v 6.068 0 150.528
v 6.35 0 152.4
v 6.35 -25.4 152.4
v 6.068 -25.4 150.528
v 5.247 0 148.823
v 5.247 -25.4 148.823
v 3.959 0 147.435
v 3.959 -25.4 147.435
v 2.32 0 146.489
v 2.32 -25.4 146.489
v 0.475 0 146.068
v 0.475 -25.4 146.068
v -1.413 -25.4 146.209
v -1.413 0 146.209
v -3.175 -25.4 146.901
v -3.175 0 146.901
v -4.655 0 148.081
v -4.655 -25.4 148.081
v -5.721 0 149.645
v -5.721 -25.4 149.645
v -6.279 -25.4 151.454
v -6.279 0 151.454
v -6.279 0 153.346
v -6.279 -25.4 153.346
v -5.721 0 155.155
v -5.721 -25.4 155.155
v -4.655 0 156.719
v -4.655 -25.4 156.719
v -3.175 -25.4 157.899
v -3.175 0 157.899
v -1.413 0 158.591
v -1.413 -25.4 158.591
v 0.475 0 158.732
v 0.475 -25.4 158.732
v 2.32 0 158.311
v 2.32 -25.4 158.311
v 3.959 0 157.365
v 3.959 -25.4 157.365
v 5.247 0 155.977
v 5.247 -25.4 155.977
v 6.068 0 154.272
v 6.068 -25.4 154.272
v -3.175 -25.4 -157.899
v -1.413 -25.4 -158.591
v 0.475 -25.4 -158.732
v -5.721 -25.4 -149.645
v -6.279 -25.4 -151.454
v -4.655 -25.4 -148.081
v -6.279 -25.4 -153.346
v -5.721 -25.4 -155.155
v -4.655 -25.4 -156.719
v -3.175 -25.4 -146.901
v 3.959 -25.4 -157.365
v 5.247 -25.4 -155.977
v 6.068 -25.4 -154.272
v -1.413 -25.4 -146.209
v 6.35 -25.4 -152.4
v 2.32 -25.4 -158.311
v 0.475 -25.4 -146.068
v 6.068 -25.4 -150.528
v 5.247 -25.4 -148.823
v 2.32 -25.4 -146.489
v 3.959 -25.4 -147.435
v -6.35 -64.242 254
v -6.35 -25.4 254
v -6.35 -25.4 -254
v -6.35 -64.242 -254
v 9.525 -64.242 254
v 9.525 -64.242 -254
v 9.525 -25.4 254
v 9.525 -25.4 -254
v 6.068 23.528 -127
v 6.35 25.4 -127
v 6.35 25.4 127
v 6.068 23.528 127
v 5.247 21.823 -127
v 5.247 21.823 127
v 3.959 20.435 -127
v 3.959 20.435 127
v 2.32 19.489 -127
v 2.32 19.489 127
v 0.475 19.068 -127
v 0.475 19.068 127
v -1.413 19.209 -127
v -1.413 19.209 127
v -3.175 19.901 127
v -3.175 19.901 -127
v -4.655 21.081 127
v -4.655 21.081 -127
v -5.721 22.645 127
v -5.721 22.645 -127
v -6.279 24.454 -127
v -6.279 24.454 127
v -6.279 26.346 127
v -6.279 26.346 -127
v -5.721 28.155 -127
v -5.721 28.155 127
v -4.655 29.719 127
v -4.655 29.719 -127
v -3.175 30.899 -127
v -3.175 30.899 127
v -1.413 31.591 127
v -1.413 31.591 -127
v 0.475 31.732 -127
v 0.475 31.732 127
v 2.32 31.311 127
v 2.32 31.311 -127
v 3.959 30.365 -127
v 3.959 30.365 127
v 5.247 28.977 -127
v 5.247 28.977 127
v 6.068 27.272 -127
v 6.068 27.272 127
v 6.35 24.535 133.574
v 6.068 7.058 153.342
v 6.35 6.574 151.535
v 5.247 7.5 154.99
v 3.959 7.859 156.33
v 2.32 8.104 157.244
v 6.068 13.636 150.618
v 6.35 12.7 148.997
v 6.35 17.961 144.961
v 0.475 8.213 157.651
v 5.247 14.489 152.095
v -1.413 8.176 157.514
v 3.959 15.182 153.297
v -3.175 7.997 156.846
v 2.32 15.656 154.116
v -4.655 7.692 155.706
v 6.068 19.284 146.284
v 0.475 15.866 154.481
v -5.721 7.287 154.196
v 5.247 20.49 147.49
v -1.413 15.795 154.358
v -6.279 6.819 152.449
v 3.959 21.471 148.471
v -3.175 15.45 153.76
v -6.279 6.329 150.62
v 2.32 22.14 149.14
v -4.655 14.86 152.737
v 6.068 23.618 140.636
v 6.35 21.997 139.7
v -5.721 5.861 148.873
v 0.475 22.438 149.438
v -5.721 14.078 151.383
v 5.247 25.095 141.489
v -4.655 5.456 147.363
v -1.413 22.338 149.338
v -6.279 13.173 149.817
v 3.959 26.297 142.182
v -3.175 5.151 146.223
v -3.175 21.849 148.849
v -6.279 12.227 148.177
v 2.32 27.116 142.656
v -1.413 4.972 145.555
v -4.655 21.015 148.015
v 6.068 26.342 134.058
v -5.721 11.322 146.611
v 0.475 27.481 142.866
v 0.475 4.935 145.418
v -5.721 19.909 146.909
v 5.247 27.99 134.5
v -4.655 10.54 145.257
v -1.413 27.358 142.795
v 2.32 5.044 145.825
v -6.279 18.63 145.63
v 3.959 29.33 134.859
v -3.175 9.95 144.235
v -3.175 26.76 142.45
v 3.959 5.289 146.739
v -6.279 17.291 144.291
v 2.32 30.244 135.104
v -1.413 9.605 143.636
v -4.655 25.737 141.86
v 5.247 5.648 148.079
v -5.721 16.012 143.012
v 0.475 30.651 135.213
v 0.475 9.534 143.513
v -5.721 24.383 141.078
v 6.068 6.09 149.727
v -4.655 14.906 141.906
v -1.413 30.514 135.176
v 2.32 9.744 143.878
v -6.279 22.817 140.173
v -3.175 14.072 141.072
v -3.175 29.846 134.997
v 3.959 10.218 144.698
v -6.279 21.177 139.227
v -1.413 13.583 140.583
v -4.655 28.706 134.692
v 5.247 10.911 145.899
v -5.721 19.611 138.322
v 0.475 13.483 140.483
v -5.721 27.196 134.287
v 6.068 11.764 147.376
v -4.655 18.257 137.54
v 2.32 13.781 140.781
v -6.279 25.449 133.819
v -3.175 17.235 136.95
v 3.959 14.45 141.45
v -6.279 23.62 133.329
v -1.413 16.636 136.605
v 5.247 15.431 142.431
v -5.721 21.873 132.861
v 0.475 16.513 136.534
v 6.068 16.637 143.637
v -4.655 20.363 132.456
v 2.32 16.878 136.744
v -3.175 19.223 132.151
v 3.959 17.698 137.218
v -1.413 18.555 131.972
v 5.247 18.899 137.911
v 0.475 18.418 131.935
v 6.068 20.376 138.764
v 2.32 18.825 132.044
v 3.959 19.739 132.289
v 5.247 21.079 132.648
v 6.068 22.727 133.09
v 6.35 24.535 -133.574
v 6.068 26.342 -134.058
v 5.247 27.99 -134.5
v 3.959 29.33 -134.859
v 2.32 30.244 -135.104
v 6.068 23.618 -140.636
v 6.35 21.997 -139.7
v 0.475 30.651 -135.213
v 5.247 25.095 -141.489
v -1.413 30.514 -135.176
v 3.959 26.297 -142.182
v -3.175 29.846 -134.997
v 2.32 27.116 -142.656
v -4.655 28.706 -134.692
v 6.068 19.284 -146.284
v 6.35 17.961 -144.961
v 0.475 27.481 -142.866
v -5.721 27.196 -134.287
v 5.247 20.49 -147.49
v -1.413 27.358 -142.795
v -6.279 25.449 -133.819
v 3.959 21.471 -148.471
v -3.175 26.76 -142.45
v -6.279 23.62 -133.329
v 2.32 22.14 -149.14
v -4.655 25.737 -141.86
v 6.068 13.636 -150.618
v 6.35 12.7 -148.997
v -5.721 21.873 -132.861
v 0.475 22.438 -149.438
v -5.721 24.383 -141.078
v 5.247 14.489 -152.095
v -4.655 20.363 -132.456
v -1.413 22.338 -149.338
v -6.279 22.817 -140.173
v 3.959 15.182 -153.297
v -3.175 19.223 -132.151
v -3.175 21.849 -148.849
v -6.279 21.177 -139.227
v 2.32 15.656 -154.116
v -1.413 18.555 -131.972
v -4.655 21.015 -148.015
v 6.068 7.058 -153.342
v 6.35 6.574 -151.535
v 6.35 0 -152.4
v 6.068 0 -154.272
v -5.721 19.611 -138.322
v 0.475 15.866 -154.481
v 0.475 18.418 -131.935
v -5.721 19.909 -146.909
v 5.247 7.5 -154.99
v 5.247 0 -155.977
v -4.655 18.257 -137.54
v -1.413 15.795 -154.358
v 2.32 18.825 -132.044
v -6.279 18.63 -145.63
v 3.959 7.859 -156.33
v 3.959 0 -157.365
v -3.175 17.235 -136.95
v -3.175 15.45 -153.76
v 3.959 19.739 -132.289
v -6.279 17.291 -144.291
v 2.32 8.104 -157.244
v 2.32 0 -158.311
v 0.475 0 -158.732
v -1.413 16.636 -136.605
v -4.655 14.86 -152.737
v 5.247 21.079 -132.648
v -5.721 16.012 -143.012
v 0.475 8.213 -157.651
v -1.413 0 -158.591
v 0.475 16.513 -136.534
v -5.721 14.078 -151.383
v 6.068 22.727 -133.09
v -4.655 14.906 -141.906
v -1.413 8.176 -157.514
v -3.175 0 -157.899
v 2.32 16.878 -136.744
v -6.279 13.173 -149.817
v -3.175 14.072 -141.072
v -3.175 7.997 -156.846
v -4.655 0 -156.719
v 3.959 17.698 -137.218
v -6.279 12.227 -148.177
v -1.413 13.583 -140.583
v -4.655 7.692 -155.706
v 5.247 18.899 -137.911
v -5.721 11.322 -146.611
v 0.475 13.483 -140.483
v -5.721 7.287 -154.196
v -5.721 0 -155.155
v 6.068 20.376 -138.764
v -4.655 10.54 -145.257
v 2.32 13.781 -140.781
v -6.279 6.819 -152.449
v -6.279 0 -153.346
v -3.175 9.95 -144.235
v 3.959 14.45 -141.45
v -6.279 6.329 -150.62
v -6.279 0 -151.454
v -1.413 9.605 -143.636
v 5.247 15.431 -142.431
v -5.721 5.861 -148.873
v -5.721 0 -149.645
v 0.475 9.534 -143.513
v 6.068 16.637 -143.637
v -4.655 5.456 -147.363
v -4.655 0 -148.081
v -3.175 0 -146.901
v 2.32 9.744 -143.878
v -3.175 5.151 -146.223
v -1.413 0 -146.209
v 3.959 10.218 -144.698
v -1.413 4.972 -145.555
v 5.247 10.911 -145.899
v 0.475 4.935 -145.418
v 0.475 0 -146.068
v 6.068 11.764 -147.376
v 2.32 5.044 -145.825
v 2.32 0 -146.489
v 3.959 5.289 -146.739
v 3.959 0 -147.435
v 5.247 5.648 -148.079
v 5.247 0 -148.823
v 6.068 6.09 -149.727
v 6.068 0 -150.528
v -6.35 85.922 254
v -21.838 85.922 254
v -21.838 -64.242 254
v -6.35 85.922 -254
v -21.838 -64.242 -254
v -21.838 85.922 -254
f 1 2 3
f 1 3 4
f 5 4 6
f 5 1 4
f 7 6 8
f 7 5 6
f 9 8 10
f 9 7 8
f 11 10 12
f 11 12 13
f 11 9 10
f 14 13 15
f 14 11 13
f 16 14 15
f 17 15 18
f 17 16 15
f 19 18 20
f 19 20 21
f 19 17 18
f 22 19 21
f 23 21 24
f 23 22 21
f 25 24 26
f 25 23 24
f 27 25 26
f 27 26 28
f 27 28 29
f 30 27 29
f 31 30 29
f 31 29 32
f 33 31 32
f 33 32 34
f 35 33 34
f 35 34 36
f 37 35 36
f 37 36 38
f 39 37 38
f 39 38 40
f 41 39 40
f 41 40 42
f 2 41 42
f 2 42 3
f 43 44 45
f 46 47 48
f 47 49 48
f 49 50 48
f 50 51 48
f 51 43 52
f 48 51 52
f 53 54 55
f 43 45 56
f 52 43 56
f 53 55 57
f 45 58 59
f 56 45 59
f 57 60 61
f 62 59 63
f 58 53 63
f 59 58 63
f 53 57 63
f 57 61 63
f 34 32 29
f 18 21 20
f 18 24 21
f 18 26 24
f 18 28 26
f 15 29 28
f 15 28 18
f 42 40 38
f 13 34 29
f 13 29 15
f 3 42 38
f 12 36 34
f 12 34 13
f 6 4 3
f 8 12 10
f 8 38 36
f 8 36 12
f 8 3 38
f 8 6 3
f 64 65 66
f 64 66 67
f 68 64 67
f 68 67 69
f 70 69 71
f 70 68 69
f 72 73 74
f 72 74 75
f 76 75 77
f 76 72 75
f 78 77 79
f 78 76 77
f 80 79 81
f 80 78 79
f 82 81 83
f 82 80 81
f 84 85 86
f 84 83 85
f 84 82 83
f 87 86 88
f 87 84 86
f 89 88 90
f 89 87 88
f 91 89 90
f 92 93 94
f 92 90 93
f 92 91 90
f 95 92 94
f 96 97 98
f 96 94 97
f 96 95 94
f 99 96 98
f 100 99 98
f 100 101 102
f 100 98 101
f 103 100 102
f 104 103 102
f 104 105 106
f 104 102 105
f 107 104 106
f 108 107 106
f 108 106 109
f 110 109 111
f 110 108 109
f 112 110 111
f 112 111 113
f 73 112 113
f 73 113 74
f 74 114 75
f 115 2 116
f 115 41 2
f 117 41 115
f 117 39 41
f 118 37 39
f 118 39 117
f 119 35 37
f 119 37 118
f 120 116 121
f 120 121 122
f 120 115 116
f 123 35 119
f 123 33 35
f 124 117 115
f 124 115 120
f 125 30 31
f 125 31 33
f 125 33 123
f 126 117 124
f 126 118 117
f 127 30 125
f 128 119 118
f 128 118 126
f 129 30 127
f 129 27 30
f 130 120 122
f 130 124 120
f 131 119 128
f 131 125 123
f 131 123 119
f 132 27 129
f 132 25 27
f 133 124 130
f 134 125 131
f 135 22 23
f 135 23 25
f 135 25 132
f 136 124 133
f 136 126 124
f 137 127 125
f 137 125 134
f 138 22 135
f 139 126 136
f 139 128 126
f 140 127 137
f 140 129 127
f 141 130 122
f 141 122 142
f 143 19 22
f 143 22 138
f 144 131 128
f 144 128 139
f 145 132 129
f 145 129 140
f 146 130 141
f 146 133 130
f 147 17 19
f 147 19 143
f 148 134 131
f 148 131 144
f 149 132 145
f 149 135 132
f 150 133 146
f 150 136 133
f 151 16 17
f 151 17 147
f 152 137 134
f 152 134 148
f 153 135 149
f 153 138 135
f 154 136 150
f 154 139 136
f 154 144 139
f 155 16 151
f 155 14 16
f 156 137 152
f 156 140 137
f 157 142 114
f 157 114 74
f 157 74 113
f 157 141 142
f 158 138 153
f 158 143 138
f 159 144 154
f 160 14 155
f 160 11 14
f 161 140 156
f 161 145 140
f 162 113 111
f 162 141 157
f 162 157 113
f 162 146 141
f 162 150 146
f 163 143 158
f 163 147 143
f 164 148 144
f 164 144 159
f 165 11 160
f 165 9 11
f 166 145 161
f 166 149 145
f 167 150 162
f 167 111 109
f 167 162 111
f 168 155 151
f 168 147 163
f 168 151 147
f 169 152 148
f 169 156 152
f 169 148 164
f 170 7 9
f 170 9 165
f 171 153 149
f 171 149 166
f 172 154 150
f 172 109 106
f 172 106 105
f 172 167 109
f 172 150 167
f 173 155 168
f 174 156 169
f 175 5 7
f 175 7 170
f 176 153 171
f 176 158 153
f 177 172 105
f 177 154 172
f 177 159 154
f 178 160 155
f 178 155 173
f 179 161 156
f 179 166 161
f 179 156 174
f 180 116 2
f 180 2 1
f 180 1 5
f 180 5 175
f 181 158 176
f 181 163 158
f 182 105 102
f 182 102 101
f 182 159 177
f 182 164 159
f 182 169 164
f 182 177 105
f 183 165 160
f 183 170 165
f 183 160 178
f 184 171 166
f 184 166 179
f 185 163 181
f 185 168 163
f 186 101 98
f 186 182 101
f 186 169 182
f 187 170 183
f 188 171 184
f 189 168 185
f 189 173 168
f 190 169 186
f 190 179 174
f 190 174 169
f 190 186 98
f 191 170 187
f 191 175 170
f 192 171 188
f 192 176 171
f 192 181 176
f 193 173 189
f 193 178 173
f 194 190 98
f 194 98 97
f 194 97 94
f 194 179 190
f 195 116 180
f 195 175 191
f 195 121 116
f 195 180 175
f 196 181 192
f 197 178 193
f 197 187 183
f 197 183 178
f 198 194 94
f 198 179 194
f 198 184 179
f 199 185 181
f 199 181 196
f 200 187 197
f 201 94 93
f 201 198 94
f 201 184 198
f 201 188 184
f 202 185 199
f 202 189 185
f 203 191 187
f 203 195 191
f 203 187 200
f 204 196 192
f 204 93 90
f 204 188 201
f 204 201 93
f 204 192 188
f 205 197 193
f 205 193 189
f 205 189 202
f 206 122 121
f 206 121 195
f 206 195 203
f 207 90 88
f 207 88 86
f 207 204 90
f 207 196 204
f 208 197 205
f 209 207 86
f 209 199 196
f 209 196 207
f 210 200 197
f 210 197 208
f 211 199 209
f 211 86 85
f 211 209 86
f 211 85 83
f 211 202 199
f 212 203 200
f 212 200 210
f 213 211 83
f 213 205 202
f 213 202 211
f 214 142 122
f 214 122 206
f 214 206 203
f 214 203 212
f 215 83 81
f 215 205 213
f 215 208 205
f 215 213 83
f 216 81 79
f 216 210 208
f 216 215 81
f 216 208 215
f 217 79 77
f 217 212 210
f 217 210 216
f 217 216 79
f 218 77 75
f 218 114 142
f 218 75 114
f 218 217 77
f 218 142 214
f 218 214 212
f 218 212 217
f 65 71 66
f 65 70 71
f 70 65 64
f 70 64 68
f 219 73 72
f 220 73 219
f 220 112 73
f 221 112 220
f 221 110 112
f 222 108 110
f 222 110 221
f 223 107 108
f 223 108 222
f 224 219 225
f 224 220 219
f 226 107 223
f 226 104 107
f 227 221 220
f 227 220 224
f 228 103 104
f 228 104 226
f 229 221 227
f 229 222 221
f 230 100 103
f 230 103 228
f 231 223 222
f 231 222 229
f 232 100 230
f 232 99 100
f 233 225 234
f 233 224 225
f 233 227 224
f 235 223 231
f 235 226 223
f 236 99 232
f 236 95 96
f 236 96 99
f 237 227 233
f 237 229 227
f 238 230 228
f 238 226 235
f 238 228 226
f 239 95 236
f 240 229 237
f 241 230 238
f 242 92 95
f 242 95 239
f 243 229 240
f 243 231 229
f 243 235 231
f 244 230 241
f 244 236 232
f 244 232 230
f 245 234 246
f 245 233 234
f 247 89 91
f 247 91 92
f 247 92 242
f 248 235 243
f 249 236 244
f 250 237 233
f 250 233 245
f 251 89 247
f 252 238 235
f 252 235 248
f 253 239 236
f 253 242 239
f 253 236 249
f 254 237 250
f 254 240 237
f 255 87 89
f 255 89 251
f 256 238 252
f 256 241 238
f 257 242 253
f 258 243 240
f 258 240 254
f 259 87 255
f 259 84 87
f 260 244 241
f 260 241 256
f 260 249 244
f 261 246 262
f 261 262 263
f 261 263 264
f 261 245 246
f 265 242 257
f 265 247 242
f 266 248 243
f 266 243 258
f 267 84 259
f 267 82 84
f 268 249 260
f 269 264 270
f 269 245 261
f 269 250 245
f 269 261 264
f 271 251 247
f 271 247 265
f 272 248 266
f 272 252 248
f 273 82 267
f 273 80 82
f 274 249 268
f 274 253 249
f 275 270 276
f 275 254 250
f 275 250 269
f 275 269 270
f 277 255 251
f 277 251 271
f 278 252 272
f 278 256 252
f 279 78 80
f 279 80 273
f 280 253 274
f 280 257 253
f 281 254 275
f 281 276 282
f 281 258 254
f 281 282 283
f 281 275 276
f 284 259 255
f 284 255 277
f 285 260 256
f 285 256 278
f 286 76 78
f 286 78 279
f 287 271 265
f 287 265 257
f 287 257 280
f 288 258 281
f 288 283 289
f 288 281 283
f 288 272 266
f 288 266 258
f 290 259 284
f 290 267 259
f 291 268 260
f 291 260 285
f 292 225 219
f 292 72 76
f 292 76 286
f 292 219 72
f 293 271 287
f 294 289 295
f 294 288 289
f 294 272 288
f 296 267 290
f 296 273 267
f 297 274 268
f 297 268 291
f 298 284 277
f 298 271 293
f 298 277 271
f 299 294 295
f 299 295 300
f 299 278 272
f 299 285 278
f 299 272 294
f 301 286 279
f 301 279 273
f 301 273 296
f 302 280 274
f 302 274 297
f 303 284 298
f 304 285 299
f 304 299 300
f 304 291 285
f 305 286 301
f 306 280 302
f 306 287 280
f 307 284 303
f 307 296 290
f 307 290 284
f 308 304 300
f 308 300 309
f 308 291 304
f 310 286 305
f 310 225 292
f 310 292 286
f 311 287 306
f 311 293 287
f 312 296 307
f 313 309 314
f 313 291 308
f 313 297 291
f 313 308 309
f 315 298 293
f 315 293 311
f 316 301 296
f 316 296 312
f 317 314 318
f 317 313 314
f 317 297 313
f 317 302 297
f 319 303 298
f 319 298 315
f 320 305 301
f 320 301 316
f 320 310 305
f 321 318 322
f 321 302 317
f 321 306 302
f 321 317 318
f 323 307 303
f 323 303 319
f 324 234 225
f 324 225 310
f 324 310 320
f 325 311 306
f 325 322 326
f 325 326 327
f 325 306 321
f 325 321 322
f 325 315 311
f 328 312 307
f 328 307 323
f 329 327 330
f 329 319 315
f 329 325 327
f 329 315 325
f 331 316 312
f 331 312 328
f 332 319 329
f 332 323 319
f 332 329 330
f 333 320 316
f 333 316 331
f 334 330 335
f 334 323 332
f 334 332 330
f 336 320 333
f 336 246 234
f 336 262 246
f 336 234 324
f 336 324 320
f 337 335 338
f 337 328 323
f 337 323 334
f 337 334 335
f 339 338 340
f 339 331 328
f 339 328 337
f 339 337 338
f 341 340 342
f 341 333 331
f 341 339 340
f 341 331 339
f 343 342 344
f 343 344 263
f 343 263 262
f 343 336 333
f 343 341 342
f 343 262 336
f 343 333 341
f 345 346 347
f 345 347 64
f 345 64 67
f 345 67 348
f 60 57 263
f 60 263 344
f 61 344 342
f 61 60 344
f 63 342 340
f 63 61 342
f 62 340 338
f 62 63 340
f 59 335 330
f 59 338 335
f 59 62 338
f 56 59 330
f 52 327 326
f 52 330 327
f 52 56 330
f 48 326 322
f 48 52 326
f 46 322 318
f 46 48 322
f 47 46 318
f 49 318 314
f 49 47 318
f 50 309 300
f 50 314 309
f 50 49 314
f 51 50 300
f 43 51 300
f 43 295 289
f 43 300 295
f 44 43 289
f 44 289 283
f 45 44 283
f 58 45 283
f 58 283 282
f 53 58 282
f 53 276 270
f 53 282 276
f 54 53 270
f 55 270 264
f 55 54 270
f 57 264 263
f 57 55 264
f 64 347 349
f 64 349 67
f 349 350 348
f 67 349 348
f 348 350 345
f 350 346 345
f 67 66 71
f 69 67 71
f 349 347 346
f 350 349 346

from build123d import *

# Parameters (mm, degrees)
F1_R     = 6.35
F5_DEPTH = 254
F4_W     = 15.4882142484
F4_H     = 150.1632109284
F6_DEPTH = 254


with BuildPart() as f2:
    # F2: sweep along a path in F0
    with BuildLine(Plane.YZ) as f2_path:
        Line((-25.4, 152.4), (0, 152.4))
        ThreePointArc((0, 152.4), (17.9605122421, 144.9605122421), (25.4, 127))
        Line((25.4, 127), (25.4, 0))
        Line((25.4, 0), (25.4, -127))
        ThreePointArc((25.4, -127), (17.9605122421, -144.9605122421), (0, -152.4))
        Line((0, -152.4), (-25.4, -152.4))
    # F1 (on Top) → F2 (sweep)
    with BuildSketch(Plane.XY):
        with Locations((0, 25.4)):
            Circle(F1_R)
    sweep(path=f2_path.line)


with BuildPart() as f5:
    # F3 (on Top) → F5 (new body, symmetric)
    with BuildSketch(Plane.XY):
        Polygon((9.525, -25.4), (6.35, -25.4), (-6.35, -25.4), (-6.35, -64.2415359616), (9.525, -64.2415359616), align=None)
    extrude(amount=F5_DEPTH, both=True)


with BuildPart() as f6:
    # F4 (on Top) → F6 (new body, symmetric)
    with BuildSketch(Plane.XY):
        with Locations((-14.0941071242, 10.8400695026)):
            Rectangle(F4_W, F4_H)
    extrude(amount=F6_DEPTH, both=True)


solid = Compound([f2.part, f5.part, f6.part])
